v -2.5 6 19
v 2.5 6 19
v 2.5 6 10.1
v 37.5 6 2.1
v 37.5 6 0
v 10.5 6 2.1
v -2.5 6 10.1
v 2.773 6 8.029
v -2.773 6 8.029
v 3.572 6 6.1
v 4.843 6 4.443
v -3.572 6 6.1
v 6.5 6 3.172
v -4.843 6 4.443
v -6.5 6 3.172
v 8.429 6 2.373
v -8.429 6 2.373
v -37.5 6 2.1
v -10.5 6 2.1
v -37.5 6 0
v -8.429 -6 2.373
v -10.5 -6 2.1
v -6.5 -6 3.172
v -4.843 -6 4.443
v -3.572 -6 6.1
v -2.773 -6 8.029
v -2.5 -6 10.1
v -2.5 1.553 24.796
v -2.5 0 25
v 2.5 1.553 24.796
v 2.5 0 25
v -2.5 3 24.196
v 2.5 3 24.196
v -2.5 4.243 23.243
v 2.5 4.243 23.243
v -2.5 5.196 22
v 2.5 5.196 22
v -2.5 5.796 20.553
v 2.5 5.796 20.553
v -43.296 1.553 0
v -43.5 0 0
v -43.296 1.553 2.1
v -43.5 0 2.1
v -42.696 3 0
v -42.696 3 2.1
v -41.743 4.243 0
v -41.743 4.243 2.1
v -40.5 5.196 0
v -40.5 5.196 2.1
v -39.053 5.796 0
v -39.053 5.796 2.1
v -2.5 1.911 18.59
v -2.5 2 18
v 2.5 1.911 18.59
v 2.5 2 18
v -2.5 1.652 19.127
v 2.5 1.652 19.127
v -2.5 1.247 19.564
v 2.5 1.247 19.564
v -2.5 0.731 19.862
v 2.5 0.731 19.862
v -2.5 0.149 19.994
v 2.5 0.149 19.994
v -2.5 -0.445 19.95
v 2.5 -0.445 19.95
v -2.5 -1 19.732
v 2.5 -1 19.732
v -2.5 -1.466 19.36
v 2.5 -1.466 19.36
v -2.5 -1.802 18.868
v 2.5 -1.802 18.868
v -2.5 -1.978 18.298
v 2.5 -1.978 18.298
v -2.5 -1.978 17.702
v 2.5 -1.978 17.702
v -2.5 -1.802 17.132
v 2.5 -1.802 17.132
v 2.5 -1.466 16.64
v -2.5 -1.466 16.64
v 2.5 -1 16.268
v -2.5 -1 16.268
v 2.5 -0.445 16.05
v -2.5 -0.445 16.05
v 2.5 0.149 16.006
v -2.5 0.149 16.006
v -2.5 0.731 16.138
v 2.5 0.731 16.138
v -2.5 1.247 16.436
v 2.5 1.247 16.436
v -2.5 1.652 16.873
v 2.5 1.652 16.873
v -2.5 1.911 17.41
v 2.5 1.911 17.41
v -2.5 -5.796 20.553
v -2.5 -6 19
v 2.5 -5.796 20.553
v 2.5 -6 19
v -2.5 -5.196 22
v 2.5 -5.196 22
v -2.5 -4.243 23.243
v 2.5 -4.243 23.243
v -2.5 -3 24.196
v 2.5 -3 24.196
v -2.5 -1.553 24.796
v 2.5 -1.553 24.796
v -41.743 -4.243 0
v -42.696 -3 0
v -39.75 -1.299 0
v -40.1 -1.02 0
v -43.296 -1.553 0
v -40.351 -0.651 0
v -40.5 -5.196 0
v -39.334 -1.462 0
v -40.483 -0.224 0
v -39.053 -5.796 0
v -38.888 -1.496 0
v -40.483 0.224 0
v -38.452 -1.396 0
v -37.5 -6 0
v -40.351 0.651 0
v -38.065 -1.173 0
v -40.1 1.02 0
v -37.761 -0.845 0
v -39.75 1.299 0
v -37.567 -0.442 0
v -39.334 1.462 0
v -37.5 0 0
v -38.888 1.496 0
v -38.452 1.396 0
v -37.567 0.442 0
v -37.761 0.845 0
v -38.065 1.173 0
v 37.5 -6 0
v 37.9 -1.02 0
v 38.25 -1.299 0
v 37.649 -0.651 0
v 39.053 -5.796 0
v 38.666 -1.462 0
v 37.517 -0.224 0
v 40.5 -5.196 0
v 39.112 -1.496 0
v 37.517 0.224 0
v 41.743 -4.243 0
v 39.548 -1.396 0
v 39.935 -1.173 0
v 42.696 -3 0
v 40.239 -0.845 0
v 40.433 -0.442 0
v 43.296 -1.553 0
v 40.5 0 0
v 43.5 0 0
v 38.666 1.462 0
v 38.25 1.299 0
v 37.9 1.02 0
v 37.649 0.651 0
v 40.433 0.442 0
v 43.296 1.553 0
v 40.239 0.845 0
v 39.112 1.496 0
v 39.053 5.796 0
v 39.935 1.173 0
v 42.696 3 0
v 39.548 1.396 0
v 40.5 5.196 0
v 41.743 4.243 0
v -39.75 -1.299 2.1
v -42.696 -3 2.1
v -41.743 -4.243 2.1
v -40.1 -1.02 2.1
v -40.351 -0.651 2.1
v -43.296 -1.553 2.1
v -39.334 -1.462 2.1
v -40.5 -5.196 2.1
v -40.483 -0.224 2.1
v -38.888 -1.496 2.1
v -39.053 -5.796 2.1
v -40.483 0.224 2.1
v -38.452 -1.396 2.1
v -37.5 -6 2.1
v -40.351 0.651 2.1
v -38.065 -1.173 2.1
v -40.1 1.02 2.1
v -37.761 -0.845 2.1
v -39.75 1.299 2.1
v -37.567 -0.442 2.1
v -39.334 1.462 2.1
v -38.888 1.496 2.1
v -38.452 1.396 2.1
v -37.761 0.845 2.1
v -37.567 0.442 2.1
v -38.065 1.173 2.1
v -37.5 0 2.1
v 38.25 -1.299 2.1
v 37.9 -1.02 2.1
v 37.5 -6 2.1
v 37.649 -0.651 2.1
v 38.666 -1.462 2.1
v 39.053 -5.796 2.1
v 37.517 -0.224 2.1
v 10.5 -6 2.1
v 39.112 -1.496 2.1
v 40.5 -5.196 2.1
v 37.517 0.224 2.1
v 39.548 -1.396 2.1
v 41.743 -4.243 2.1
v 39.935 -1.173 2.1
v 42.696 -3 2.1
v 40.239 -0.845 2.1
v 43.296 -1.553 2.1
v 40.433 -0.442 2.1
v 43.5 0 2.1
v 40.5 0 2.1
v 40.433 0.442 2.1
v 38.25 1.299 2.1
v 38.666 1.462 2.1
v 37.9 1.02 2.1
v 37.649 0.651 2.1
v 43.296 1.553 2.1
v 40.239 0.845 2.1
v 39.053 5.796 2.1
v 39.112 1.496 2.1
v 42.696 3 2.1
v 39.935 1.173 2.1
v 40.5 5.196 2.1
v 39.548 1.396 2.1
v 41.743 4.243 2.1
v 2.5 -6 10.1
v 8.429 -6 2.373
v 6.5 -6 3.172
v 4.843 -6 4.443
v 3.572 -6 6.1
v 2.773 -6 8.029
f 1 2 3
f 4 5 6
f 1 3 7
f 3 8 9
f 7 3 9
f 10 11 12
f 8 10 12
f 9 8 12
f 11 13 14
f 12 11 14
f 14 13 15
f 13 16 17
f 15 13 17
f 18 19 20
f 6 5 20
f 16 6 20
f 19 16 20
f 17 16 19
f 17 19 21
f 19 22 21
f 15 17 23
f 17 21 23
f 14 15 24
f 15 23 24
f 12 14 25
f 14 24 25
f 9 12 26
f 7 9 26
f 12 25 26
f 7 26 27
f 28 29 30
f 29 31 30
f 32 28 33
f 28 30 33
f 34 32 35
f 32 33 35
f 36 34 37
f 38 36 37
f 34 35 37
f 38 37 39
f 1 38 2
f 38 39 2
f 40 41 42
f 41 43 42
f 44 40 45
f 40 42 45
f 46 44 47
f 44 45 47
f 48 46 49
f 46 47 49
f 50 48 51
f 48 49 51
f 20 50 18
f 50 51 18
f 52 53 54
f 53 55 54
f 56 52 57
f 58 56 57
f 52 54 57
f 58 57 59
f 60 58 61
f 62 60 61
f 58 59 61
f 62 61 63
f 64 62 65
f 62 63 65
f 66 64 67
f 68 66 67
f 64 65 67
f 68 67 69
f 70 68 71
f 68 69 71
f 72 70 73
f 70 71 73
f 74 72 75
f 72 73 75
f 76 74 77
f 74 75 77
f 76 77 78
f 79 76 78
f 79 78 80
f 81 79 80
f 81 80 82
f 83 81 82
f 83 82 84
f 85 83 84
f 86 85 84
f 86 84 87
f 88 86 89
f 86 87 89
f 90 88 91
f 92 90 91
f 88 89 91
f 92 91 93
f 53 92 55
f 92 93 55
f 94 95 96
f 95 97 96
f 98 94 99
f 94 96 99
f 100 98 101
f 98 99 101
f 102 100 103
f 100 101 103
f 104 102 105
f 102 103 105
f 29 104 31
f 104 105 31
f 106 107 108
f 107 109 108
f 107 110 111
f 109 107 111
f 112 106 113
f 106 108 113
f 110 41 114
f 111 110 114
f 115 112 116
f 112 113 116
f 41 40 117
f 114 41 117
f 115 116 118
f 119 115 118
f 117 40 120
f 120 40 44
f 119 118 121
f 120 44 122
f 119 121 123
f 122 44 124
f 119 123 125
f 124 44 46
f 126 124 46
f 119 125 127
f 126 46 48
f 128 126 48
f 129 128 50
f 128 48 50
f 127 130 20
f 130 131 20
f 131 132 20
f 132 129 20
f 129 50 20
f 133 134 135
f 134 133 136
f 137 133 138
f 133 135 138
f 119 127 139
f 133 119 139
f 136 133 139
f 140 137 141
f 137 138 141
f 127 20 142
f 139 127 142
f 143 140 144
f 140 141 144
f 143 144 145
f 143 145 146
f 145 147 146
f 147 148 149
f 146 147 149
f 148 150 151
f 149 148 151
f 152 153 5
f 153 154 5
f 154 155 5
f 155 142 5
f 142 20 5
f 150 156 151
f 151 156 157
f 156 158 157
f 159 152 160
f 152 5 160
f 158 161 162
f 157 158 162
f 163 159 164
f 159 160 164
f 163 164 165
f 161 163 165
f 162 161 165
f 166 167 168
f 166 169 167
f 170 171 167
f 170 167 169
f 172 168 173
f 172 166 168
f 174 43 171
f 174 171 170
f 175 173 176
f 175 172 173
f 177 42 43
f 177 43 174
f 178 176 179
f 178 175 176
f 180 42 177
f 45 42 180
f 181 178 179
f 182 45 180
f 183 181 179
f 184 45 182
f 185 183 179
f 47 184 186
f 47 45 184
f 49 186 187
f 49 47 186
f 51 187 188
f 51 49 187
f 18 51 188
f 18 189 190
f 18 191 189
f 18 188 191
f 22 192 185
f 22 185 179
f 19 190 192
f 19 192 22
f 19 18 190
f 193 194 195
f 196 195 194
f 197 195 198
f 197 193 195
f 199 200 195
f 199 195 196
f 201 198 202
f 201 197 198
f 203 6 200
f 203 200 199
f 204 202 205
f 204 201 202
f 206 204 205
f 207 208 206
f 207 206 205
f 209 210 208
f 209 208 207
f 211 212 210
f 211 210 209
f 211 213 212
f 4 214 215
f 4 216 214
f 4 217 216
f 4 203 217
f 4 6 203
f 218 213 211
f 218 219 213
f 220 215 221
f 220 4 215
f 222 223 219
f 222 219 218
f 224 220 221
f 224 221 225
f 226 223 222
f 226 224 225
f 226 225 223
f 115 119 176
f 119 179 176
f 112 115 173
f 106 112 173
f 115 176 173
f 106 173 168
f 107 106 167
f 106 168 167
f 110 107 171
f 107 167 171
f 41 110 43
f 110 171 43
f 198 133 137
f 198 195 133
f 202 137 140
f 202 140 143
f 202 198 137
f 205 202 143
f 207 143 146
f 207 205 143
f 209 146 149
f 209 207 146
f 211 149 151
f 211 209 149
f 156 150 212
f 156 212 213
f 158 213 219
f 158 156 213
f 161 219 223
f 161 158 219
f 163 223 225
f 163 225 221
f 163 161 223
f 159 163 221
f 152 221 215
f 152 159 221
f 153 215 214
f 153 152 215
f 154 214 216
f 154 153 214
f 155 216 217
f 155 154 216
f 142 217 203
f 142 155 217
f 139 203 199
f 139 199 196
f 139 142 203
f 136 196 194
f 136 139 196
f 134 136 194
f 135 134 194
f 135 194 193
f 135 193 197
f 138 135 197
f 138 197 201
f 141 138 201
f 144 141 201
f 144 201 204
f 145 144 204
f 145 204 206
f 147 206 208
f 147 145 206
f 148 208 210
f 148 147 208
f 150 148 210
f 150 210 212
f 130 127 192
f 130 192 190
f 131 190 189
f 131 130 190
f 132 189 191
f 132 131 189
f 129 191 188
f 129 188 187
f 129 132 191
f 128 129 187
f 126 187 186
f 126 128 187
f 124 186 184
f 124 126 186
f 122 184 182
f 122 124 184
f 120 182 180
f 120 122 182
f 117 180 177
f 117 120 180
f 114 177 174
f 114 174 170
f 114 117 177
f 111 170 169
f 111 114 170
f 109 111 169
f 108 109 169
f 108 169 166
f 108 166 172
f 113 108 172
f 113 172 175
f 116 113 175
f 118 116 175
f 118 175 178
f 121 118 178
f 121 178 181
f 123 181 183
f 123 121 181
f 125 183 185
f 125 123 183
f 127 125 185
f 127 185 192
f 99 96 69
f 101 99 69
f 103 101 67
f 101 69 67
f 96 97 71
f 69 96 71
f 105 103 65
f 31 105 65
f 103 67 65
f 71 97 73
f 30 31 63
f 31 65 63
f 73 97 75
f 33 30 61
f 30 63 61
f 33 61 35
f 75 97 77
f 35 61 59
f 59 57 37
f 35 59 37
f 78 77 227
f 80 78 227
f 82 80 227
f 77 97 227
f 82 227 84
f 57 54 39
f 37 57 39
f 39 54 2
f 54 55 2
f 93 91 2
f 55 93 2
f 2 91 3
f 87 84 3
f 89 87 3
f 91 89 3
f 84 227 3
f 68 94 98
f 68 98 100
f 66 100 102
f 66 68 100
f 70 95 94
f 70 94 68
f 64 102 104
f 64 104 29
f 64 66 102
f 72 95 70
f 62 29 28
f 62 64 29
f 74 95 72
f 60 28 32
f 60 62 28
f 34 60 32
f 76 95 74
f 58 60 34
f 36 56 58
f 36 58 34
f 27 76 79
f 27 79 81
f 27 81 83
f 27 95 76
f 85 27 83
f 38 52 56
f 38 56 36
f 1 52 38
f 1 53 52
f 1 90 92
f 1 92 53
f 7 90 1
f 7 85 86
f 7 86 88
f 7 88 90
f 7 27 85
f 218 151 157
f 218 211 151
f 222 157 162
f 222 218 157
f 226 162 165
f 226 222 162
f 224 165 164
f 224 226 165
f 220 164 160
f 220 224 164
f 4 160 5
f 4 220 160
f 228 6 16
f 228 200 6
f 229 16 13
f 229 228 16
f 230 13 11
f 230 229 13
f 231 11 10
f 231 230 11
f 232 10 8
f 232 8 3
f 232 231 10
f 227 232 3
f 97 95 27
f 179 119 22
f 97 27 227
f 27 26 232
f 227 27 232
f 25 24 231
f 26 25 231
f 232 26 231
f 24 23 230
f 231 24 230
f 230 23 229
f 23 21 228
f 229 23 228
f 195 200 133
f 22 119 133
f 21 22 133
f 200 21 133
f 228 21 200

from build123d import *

# Parameters (mm, degrees)
F0_W     = 41
F0_H     = 12
F0_R     = 1.5
F0_W_2   = 5
F1_DEPTH = 2.1
F2_DEPTH = 25
F3_R     = 2
F4_DEPTH = 12.5
F5_R     = 5.99999
F6_R     = 8


# Not quite as in the source:
# - a fillet or chamfer is up to 0.001 mm smaller than in the source, because OpenCascade refuses the exact size


with BuildPart() as f1:
    # F0 (on Top) → F1 (new body)
    with BuildSketch(Plane.XY):
        with Locations((-23, 0)):
            Rectangle(F0_W, F0_H)
        with Locations((-39, 0)):
            Circle(F0_R, mode=Mode.SUBTRACT)
        Rectangle(F0_W_2, F0_H)
        with Locations((23, 0)):
            Rectangle(F0_W, F0_H)
        with Locations((39, 0)):
            Circle(F0_R, mode=Mode.SUBTRACT)
    extrude(amount=F1_DEPTH)

    # F0 (on Top) → F2 (join)
    with BuildSketch(Plane.XY):
        Rectangle(F0_W_2, F0_H)
    extrude(amount=F2_DEPTH)

    # F3 (on Right) → F4 (cut, symmetric)
    with BuildSketch(Plane.YZ):
        with Locations((0, 18)):
            Circle(F3_R)
    extrude(amount=F4_DEPTH, both=True, mode=Mode.SUBTRACT)

    # F5 (radius 6 in the source; OpenCascade refuses exactly that, so slightly less here)
    f5_edges = [f1.edges().sort_by_distance(p)[0] for p in [
        (0, -6, 25),
        (0, 6, 25),
        (-43.5, -6, 1.05),
        (-43.5, 6, 1.05),
        (43.5, -6, 1.05),
        (43.5, 6, 1.05),
    ]]
    fillet(f5_edges, radius=F5_R)

    # F6
    f6_edges = [f1.edges().sort_by_distance(p)[0] for p in [
        (2.5, 0, 2.1),
        (-2.5, 0, 2.1),
    ]]
    fillet(f6_edges, radius=F6_R)


solid = f1.part
